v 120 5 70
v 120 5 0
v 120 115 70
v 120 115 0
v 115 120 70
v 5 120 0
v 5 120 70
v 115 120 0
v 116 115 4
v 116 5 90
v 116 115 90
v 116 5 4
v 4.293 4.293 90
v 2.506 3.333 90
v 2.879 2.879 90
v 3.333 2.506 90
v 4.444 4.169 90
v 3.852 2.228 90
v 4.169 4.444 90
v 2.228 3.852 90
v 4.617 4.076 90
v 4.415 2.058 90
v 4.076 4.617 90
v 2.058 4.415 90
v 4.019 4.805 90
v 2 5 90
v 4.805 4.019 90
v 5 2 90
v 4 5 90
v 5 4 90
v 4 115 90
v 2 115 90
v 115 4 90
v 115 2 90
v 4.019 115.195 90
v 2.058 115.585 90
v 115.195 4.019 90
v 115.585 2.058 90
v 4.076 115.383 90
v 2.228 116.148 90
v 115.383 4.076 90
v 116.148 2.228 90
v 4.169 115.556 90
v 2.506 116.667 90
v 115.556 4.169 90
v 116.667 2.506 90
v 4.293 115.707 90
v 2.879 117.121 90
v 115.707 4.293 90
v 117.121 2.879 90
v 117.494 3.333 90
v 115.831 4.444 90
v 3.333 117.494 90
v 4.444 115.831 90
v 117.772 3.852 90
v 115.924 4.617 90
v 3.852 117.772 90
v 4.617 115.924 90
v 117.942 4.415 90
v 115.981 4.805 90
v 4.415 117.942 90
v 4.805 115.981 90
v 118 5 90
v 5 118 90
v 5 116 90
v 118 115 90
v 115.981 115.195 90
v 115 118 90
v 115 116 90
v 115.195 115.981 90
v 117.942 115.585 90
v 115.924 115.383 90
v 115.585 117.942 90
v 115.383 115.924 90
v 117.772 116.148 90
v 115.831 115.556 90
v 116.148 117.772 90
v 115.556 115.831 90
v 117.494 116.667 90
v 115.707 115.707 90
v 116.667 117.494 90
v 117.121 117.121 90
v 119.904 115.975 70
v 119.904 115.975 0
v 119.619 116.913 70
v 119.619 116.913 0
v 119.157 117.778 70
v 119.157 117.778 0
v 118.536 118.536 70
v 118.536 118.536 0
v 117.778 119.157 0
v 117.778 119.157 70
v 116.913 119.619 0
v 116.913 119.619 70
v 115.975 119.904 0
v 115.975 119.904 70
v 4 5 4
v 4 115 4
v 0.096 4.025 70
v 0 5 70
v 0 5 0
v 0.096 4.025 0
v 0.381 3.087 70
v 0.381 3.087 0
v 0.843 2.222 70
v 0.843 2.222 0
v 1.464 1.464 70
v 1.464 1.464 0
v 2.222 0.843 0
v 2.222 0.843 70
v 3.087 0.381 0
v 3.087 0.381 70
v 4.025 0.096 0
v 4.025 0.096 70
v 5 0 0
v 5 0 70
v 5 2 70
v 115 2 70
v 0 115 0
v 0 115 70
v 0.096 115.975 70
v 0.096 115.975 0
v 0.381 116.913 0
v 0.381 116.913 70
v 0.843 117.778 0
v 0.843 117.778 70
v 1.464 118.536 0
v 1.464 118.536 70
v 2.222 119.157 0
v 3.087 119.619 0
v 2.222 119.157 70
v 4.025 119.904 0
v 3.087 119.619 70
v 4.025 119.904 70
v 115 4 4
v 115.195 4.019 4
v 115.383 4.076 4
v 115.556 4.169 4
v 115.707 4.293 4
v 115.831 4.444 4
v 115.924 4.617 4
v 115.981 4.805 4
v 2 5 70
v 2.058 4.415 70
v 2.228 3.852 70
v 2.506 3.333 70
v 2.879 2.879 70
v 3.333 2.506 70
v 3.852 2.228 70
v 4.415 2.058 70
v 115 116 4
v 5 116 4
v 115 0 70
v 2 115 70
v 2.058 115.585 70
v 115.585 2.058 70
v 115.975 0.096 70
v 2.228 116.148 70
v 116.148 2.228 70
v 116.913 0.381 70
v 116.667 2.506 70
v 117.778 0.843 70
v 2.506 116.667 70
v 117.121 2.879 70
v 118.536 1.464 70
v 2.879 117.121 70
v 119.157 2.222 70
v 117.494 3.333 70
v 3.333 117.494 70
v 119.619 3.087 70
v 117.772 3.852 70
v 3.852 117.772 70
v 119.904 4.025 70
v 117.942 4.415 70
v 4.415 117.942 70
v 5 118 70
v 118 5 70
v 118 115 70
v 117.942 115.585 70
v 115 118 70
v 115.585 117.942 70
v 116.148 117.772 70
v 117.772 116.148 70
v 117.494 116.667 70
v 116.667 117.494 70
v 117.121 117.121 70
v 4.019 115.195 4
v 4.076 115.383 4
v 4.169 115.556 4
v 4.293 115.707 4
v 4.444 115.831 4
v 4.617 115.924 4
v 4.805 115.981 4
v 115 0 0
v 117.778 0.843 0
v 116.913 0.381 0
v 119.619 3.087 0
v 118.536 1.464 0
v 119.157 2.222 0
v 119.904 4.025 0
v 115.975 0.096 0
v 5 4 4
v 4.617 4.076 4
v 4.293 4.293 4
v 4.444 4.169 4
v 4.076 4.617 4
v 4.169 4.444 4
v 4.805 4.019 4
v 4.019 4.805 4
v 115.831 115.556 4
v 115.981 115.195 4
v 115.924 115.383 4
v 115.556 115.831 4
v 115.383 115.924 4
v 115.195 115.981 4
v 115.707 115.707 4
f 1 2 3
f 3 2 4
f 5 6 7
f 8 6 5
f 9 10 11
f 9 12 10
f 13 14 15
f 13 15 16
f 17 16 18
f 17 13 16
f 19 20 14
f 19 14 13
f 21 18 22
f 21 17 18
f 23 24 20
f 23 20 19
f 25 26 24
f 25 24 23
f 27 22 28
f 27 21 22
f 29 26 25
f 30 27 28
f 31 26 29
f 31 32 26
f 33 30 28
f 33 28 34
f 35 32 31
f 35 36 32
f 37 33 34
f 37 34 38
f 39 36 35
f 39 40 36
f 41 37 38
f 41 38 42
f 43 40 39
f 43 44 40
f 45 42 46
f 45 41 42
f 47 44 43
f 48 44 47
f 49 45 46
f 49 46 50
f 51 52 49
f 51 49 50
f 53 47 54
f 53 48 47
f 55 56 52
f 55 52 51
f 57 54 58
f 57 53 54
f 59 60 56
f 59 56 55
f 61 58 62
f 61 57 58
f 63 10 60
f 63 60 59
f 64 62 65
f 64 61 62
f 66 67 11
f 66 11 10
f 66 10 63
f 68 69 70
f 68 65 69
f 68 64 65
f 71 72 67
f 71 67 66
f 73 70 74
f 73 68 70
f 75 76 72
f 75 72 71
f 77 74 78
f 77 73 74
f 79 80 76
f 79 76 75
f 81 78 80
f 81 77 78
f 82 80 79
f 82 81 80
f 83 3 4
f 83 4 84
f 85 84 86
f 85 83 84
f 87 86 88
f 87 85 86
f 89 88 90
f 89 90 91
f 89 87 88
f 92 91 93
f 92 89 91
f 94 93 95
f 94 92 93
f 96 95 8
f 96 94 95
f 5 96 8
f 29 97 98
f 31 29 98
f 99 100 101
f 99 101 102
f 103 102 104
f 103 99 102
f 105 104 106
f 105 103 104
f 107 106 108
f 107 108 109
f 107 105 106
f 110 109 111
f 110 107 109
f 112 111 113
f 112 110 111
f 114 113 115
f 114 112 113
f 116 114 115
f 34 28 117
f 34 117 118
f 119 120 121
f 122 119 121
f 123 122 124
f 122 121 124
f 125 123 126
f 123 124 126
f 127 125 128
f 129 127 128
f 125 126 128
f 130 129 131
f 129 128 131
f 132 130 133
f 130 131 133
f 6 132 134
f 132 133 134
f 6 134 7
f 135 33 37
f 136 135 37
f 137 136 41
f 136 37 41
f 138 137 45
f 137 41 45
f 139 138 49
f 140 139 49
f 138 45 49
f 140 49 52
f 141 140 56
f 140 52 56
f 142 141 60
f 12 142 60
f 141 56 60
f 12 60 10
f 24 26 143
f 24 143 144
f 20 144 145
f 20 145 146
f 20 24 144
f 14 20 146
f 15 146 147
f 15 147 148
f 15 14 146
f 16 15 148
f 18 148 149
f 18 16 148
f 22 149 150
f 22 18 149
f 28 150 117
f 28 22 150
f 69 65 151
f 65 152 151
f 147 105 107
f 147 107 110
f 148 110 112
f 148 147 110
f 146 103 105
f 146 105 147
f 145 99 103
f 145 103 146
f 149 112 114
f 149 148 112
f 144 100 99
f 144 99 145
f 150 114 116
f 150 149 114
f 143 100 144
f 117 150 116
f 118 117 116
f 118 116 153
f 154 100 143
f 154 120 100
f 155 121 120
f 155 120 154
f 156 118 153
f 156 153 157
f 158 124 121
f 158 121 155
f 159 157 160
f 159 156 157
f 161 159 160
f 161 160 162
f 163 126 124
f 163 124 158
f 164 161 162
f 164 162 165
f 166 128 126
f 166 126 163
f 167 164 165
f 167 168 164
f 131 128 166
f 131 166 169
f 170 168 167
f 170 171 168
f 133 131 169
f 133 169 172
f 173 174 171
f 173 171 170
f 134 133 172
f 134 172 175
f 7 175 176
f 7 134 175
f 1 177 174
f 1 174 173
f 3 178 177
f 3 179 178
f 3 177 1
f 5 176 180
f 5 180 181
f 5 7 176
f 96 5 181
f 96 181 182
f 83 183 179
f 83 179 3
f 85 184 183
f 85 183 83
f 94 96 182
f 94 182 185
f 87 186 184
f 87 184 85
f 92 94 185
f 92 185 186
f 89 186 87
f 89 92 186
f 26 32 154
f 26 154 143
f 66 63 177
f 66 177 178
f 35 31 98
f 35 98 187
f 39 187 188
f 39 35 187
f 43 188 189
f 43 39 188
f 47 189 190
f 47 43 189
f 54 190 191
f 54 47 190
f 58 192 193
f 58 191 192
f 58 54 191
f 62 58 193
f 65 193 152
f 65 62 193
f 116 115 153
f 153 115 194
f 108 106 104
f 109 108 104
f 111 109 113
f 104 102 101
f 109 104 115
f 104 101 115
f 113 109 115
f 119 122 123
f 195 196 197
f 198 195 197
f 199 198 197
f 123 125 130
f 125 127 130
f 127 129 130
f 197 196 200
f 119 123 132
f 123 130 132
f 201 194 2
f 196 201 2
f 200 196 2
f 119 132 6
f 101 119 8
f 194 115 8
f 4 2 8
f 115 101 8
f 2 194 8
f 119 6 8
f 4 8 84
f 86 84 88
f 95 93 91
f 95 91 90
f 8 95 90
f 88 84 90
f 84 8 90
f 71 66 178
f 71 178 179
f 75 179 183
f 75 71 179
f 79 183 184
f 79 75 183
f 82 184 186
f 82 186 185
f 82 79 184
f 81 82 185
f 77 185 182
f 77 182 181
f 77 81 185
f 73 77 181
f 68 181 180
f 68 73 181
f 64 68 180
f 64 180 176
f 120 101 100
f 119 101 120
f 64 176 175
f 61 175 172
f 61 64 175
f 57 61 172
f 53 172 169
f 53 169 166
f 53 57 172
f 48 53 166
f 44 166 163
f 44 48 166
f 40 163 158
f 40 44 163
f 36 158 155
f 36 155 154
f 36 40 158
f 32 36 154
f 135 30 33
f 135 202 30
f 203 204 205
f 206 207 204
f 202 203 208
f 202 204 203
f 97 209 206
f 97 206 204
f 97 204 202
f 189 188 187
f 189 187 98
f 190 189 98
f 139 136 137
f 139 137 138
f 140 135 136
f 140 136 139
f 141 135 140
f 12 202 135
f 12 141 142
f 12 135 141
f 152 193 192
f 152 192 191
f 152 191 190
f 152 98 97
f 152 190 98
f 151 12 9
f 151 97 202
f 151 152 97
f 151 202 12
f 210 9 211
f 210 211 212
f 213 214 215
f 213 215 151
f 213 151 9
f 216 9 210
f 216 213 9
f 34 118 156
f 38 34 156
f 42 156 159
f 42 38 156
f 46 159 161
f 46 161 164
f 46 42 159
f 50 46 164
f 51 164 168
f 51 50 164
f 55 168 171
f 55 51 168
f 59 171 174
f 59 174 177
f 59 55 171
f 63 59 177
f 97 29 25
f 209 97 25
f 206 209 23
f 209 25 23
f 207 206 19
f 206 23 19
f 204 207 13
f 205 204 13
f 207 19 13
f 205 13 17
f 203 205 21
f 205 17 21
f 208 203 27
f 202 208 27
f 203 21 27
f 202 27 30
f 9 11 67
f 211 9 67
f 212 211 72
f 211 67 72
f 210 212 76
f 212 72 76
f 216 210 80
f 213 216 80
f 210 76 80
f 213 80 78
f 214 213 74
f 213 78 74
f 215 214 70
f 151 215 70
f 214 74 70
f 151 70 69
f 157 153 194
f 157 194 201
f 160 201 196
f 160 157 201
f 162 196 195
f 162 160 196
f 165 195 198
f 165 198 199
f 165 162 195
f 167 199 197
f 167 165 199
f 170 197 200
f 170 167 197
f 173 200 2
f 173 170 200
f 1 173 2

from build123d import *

# Parameters (mm, degrees)
SKETCH1_W           = 120
SKETCH1_H           = 120
BOSS_EXTRUDE1_DEPTH = 90
FILLET1_R           = 5
SHELL1_T            = -4
CUT_EXTRUDE2_DEPTH  = 20


with BuildPart() as part:
    # Sketch1 → Boss-Extrude1 (new body)
    with BuildSketch(Plane.XY):
        with Locations((60, 60)):
            Rectangle(SKETCH1_W, SKETCH1_H)
    extrude(amount=BOSS_EXTRUDE1_DEPTH)

    # Fillet1
    fillet1_edges = [part.edges().sort_by_distance(p)[0] for p in [
        (0, 120, 45),
        (120, 120, 45),
        (120, 0, 45),
        (0, 0, 45),
    ]]
    fillet(fillet1_edges, radius=FILLET1_R)

    # Shell1
    shell1_openings = [part.faces().sort_by_distance(p)[0] for p in [
        (60, 60, 90),
    ]]
    offset(amount=SHELL1_T, openings=shell1_openings, kind=Kind.INTERSECTION)

    # Sketch8 → Cut-Extrude2 (cut)
    with BuildSketch(Plane.XY.offset(90)):
        with BuildLine():
            Line((120, 5), (120, 115))
            ThreePointArc((120, 115), (118.535533906, 118.535533906), (115, 120))
            Line((115, 120), (5, 120))
            ThreePointArc((5, 120), (1.464466094, 118.535533906), (0, 115))
            Line((0, 115), (0, 5))
            ThreePointArc((0, 5), (1.464466094, 1.464466094), (5, 0))
            Line((5, 0), (115, 0))
            ThreePointArc((115, 0), (118.535533906, 1.464466094), (120, 5))
        make_face()
        with BuildLine():
            Line((118, 5), (118, 115))
            ThreePointArc((118, 115), (117.121320344, 117.121320344), (115, 118))
            Line((115, 118), (5, 118))
            ThreePointArc((5, 118), (2.878679656, 117.121320344), (2, 115))
            Line((2, 115), (2, 5))
            ThreePointArc((2, 5), (2.878679656, 2.878679656), (5, 2))
            Line((5, 2), (115, 2))
            ThreePointArc((115, 2), (117.121320344, 2.878679656), (118, 5))
        make_face(mode=Mode.SUBTRACT)
    extrude(amount=-CUT_EXTRUDE2_DEPTH, mode=Mode.SUBTRACT)


solid = part.part
